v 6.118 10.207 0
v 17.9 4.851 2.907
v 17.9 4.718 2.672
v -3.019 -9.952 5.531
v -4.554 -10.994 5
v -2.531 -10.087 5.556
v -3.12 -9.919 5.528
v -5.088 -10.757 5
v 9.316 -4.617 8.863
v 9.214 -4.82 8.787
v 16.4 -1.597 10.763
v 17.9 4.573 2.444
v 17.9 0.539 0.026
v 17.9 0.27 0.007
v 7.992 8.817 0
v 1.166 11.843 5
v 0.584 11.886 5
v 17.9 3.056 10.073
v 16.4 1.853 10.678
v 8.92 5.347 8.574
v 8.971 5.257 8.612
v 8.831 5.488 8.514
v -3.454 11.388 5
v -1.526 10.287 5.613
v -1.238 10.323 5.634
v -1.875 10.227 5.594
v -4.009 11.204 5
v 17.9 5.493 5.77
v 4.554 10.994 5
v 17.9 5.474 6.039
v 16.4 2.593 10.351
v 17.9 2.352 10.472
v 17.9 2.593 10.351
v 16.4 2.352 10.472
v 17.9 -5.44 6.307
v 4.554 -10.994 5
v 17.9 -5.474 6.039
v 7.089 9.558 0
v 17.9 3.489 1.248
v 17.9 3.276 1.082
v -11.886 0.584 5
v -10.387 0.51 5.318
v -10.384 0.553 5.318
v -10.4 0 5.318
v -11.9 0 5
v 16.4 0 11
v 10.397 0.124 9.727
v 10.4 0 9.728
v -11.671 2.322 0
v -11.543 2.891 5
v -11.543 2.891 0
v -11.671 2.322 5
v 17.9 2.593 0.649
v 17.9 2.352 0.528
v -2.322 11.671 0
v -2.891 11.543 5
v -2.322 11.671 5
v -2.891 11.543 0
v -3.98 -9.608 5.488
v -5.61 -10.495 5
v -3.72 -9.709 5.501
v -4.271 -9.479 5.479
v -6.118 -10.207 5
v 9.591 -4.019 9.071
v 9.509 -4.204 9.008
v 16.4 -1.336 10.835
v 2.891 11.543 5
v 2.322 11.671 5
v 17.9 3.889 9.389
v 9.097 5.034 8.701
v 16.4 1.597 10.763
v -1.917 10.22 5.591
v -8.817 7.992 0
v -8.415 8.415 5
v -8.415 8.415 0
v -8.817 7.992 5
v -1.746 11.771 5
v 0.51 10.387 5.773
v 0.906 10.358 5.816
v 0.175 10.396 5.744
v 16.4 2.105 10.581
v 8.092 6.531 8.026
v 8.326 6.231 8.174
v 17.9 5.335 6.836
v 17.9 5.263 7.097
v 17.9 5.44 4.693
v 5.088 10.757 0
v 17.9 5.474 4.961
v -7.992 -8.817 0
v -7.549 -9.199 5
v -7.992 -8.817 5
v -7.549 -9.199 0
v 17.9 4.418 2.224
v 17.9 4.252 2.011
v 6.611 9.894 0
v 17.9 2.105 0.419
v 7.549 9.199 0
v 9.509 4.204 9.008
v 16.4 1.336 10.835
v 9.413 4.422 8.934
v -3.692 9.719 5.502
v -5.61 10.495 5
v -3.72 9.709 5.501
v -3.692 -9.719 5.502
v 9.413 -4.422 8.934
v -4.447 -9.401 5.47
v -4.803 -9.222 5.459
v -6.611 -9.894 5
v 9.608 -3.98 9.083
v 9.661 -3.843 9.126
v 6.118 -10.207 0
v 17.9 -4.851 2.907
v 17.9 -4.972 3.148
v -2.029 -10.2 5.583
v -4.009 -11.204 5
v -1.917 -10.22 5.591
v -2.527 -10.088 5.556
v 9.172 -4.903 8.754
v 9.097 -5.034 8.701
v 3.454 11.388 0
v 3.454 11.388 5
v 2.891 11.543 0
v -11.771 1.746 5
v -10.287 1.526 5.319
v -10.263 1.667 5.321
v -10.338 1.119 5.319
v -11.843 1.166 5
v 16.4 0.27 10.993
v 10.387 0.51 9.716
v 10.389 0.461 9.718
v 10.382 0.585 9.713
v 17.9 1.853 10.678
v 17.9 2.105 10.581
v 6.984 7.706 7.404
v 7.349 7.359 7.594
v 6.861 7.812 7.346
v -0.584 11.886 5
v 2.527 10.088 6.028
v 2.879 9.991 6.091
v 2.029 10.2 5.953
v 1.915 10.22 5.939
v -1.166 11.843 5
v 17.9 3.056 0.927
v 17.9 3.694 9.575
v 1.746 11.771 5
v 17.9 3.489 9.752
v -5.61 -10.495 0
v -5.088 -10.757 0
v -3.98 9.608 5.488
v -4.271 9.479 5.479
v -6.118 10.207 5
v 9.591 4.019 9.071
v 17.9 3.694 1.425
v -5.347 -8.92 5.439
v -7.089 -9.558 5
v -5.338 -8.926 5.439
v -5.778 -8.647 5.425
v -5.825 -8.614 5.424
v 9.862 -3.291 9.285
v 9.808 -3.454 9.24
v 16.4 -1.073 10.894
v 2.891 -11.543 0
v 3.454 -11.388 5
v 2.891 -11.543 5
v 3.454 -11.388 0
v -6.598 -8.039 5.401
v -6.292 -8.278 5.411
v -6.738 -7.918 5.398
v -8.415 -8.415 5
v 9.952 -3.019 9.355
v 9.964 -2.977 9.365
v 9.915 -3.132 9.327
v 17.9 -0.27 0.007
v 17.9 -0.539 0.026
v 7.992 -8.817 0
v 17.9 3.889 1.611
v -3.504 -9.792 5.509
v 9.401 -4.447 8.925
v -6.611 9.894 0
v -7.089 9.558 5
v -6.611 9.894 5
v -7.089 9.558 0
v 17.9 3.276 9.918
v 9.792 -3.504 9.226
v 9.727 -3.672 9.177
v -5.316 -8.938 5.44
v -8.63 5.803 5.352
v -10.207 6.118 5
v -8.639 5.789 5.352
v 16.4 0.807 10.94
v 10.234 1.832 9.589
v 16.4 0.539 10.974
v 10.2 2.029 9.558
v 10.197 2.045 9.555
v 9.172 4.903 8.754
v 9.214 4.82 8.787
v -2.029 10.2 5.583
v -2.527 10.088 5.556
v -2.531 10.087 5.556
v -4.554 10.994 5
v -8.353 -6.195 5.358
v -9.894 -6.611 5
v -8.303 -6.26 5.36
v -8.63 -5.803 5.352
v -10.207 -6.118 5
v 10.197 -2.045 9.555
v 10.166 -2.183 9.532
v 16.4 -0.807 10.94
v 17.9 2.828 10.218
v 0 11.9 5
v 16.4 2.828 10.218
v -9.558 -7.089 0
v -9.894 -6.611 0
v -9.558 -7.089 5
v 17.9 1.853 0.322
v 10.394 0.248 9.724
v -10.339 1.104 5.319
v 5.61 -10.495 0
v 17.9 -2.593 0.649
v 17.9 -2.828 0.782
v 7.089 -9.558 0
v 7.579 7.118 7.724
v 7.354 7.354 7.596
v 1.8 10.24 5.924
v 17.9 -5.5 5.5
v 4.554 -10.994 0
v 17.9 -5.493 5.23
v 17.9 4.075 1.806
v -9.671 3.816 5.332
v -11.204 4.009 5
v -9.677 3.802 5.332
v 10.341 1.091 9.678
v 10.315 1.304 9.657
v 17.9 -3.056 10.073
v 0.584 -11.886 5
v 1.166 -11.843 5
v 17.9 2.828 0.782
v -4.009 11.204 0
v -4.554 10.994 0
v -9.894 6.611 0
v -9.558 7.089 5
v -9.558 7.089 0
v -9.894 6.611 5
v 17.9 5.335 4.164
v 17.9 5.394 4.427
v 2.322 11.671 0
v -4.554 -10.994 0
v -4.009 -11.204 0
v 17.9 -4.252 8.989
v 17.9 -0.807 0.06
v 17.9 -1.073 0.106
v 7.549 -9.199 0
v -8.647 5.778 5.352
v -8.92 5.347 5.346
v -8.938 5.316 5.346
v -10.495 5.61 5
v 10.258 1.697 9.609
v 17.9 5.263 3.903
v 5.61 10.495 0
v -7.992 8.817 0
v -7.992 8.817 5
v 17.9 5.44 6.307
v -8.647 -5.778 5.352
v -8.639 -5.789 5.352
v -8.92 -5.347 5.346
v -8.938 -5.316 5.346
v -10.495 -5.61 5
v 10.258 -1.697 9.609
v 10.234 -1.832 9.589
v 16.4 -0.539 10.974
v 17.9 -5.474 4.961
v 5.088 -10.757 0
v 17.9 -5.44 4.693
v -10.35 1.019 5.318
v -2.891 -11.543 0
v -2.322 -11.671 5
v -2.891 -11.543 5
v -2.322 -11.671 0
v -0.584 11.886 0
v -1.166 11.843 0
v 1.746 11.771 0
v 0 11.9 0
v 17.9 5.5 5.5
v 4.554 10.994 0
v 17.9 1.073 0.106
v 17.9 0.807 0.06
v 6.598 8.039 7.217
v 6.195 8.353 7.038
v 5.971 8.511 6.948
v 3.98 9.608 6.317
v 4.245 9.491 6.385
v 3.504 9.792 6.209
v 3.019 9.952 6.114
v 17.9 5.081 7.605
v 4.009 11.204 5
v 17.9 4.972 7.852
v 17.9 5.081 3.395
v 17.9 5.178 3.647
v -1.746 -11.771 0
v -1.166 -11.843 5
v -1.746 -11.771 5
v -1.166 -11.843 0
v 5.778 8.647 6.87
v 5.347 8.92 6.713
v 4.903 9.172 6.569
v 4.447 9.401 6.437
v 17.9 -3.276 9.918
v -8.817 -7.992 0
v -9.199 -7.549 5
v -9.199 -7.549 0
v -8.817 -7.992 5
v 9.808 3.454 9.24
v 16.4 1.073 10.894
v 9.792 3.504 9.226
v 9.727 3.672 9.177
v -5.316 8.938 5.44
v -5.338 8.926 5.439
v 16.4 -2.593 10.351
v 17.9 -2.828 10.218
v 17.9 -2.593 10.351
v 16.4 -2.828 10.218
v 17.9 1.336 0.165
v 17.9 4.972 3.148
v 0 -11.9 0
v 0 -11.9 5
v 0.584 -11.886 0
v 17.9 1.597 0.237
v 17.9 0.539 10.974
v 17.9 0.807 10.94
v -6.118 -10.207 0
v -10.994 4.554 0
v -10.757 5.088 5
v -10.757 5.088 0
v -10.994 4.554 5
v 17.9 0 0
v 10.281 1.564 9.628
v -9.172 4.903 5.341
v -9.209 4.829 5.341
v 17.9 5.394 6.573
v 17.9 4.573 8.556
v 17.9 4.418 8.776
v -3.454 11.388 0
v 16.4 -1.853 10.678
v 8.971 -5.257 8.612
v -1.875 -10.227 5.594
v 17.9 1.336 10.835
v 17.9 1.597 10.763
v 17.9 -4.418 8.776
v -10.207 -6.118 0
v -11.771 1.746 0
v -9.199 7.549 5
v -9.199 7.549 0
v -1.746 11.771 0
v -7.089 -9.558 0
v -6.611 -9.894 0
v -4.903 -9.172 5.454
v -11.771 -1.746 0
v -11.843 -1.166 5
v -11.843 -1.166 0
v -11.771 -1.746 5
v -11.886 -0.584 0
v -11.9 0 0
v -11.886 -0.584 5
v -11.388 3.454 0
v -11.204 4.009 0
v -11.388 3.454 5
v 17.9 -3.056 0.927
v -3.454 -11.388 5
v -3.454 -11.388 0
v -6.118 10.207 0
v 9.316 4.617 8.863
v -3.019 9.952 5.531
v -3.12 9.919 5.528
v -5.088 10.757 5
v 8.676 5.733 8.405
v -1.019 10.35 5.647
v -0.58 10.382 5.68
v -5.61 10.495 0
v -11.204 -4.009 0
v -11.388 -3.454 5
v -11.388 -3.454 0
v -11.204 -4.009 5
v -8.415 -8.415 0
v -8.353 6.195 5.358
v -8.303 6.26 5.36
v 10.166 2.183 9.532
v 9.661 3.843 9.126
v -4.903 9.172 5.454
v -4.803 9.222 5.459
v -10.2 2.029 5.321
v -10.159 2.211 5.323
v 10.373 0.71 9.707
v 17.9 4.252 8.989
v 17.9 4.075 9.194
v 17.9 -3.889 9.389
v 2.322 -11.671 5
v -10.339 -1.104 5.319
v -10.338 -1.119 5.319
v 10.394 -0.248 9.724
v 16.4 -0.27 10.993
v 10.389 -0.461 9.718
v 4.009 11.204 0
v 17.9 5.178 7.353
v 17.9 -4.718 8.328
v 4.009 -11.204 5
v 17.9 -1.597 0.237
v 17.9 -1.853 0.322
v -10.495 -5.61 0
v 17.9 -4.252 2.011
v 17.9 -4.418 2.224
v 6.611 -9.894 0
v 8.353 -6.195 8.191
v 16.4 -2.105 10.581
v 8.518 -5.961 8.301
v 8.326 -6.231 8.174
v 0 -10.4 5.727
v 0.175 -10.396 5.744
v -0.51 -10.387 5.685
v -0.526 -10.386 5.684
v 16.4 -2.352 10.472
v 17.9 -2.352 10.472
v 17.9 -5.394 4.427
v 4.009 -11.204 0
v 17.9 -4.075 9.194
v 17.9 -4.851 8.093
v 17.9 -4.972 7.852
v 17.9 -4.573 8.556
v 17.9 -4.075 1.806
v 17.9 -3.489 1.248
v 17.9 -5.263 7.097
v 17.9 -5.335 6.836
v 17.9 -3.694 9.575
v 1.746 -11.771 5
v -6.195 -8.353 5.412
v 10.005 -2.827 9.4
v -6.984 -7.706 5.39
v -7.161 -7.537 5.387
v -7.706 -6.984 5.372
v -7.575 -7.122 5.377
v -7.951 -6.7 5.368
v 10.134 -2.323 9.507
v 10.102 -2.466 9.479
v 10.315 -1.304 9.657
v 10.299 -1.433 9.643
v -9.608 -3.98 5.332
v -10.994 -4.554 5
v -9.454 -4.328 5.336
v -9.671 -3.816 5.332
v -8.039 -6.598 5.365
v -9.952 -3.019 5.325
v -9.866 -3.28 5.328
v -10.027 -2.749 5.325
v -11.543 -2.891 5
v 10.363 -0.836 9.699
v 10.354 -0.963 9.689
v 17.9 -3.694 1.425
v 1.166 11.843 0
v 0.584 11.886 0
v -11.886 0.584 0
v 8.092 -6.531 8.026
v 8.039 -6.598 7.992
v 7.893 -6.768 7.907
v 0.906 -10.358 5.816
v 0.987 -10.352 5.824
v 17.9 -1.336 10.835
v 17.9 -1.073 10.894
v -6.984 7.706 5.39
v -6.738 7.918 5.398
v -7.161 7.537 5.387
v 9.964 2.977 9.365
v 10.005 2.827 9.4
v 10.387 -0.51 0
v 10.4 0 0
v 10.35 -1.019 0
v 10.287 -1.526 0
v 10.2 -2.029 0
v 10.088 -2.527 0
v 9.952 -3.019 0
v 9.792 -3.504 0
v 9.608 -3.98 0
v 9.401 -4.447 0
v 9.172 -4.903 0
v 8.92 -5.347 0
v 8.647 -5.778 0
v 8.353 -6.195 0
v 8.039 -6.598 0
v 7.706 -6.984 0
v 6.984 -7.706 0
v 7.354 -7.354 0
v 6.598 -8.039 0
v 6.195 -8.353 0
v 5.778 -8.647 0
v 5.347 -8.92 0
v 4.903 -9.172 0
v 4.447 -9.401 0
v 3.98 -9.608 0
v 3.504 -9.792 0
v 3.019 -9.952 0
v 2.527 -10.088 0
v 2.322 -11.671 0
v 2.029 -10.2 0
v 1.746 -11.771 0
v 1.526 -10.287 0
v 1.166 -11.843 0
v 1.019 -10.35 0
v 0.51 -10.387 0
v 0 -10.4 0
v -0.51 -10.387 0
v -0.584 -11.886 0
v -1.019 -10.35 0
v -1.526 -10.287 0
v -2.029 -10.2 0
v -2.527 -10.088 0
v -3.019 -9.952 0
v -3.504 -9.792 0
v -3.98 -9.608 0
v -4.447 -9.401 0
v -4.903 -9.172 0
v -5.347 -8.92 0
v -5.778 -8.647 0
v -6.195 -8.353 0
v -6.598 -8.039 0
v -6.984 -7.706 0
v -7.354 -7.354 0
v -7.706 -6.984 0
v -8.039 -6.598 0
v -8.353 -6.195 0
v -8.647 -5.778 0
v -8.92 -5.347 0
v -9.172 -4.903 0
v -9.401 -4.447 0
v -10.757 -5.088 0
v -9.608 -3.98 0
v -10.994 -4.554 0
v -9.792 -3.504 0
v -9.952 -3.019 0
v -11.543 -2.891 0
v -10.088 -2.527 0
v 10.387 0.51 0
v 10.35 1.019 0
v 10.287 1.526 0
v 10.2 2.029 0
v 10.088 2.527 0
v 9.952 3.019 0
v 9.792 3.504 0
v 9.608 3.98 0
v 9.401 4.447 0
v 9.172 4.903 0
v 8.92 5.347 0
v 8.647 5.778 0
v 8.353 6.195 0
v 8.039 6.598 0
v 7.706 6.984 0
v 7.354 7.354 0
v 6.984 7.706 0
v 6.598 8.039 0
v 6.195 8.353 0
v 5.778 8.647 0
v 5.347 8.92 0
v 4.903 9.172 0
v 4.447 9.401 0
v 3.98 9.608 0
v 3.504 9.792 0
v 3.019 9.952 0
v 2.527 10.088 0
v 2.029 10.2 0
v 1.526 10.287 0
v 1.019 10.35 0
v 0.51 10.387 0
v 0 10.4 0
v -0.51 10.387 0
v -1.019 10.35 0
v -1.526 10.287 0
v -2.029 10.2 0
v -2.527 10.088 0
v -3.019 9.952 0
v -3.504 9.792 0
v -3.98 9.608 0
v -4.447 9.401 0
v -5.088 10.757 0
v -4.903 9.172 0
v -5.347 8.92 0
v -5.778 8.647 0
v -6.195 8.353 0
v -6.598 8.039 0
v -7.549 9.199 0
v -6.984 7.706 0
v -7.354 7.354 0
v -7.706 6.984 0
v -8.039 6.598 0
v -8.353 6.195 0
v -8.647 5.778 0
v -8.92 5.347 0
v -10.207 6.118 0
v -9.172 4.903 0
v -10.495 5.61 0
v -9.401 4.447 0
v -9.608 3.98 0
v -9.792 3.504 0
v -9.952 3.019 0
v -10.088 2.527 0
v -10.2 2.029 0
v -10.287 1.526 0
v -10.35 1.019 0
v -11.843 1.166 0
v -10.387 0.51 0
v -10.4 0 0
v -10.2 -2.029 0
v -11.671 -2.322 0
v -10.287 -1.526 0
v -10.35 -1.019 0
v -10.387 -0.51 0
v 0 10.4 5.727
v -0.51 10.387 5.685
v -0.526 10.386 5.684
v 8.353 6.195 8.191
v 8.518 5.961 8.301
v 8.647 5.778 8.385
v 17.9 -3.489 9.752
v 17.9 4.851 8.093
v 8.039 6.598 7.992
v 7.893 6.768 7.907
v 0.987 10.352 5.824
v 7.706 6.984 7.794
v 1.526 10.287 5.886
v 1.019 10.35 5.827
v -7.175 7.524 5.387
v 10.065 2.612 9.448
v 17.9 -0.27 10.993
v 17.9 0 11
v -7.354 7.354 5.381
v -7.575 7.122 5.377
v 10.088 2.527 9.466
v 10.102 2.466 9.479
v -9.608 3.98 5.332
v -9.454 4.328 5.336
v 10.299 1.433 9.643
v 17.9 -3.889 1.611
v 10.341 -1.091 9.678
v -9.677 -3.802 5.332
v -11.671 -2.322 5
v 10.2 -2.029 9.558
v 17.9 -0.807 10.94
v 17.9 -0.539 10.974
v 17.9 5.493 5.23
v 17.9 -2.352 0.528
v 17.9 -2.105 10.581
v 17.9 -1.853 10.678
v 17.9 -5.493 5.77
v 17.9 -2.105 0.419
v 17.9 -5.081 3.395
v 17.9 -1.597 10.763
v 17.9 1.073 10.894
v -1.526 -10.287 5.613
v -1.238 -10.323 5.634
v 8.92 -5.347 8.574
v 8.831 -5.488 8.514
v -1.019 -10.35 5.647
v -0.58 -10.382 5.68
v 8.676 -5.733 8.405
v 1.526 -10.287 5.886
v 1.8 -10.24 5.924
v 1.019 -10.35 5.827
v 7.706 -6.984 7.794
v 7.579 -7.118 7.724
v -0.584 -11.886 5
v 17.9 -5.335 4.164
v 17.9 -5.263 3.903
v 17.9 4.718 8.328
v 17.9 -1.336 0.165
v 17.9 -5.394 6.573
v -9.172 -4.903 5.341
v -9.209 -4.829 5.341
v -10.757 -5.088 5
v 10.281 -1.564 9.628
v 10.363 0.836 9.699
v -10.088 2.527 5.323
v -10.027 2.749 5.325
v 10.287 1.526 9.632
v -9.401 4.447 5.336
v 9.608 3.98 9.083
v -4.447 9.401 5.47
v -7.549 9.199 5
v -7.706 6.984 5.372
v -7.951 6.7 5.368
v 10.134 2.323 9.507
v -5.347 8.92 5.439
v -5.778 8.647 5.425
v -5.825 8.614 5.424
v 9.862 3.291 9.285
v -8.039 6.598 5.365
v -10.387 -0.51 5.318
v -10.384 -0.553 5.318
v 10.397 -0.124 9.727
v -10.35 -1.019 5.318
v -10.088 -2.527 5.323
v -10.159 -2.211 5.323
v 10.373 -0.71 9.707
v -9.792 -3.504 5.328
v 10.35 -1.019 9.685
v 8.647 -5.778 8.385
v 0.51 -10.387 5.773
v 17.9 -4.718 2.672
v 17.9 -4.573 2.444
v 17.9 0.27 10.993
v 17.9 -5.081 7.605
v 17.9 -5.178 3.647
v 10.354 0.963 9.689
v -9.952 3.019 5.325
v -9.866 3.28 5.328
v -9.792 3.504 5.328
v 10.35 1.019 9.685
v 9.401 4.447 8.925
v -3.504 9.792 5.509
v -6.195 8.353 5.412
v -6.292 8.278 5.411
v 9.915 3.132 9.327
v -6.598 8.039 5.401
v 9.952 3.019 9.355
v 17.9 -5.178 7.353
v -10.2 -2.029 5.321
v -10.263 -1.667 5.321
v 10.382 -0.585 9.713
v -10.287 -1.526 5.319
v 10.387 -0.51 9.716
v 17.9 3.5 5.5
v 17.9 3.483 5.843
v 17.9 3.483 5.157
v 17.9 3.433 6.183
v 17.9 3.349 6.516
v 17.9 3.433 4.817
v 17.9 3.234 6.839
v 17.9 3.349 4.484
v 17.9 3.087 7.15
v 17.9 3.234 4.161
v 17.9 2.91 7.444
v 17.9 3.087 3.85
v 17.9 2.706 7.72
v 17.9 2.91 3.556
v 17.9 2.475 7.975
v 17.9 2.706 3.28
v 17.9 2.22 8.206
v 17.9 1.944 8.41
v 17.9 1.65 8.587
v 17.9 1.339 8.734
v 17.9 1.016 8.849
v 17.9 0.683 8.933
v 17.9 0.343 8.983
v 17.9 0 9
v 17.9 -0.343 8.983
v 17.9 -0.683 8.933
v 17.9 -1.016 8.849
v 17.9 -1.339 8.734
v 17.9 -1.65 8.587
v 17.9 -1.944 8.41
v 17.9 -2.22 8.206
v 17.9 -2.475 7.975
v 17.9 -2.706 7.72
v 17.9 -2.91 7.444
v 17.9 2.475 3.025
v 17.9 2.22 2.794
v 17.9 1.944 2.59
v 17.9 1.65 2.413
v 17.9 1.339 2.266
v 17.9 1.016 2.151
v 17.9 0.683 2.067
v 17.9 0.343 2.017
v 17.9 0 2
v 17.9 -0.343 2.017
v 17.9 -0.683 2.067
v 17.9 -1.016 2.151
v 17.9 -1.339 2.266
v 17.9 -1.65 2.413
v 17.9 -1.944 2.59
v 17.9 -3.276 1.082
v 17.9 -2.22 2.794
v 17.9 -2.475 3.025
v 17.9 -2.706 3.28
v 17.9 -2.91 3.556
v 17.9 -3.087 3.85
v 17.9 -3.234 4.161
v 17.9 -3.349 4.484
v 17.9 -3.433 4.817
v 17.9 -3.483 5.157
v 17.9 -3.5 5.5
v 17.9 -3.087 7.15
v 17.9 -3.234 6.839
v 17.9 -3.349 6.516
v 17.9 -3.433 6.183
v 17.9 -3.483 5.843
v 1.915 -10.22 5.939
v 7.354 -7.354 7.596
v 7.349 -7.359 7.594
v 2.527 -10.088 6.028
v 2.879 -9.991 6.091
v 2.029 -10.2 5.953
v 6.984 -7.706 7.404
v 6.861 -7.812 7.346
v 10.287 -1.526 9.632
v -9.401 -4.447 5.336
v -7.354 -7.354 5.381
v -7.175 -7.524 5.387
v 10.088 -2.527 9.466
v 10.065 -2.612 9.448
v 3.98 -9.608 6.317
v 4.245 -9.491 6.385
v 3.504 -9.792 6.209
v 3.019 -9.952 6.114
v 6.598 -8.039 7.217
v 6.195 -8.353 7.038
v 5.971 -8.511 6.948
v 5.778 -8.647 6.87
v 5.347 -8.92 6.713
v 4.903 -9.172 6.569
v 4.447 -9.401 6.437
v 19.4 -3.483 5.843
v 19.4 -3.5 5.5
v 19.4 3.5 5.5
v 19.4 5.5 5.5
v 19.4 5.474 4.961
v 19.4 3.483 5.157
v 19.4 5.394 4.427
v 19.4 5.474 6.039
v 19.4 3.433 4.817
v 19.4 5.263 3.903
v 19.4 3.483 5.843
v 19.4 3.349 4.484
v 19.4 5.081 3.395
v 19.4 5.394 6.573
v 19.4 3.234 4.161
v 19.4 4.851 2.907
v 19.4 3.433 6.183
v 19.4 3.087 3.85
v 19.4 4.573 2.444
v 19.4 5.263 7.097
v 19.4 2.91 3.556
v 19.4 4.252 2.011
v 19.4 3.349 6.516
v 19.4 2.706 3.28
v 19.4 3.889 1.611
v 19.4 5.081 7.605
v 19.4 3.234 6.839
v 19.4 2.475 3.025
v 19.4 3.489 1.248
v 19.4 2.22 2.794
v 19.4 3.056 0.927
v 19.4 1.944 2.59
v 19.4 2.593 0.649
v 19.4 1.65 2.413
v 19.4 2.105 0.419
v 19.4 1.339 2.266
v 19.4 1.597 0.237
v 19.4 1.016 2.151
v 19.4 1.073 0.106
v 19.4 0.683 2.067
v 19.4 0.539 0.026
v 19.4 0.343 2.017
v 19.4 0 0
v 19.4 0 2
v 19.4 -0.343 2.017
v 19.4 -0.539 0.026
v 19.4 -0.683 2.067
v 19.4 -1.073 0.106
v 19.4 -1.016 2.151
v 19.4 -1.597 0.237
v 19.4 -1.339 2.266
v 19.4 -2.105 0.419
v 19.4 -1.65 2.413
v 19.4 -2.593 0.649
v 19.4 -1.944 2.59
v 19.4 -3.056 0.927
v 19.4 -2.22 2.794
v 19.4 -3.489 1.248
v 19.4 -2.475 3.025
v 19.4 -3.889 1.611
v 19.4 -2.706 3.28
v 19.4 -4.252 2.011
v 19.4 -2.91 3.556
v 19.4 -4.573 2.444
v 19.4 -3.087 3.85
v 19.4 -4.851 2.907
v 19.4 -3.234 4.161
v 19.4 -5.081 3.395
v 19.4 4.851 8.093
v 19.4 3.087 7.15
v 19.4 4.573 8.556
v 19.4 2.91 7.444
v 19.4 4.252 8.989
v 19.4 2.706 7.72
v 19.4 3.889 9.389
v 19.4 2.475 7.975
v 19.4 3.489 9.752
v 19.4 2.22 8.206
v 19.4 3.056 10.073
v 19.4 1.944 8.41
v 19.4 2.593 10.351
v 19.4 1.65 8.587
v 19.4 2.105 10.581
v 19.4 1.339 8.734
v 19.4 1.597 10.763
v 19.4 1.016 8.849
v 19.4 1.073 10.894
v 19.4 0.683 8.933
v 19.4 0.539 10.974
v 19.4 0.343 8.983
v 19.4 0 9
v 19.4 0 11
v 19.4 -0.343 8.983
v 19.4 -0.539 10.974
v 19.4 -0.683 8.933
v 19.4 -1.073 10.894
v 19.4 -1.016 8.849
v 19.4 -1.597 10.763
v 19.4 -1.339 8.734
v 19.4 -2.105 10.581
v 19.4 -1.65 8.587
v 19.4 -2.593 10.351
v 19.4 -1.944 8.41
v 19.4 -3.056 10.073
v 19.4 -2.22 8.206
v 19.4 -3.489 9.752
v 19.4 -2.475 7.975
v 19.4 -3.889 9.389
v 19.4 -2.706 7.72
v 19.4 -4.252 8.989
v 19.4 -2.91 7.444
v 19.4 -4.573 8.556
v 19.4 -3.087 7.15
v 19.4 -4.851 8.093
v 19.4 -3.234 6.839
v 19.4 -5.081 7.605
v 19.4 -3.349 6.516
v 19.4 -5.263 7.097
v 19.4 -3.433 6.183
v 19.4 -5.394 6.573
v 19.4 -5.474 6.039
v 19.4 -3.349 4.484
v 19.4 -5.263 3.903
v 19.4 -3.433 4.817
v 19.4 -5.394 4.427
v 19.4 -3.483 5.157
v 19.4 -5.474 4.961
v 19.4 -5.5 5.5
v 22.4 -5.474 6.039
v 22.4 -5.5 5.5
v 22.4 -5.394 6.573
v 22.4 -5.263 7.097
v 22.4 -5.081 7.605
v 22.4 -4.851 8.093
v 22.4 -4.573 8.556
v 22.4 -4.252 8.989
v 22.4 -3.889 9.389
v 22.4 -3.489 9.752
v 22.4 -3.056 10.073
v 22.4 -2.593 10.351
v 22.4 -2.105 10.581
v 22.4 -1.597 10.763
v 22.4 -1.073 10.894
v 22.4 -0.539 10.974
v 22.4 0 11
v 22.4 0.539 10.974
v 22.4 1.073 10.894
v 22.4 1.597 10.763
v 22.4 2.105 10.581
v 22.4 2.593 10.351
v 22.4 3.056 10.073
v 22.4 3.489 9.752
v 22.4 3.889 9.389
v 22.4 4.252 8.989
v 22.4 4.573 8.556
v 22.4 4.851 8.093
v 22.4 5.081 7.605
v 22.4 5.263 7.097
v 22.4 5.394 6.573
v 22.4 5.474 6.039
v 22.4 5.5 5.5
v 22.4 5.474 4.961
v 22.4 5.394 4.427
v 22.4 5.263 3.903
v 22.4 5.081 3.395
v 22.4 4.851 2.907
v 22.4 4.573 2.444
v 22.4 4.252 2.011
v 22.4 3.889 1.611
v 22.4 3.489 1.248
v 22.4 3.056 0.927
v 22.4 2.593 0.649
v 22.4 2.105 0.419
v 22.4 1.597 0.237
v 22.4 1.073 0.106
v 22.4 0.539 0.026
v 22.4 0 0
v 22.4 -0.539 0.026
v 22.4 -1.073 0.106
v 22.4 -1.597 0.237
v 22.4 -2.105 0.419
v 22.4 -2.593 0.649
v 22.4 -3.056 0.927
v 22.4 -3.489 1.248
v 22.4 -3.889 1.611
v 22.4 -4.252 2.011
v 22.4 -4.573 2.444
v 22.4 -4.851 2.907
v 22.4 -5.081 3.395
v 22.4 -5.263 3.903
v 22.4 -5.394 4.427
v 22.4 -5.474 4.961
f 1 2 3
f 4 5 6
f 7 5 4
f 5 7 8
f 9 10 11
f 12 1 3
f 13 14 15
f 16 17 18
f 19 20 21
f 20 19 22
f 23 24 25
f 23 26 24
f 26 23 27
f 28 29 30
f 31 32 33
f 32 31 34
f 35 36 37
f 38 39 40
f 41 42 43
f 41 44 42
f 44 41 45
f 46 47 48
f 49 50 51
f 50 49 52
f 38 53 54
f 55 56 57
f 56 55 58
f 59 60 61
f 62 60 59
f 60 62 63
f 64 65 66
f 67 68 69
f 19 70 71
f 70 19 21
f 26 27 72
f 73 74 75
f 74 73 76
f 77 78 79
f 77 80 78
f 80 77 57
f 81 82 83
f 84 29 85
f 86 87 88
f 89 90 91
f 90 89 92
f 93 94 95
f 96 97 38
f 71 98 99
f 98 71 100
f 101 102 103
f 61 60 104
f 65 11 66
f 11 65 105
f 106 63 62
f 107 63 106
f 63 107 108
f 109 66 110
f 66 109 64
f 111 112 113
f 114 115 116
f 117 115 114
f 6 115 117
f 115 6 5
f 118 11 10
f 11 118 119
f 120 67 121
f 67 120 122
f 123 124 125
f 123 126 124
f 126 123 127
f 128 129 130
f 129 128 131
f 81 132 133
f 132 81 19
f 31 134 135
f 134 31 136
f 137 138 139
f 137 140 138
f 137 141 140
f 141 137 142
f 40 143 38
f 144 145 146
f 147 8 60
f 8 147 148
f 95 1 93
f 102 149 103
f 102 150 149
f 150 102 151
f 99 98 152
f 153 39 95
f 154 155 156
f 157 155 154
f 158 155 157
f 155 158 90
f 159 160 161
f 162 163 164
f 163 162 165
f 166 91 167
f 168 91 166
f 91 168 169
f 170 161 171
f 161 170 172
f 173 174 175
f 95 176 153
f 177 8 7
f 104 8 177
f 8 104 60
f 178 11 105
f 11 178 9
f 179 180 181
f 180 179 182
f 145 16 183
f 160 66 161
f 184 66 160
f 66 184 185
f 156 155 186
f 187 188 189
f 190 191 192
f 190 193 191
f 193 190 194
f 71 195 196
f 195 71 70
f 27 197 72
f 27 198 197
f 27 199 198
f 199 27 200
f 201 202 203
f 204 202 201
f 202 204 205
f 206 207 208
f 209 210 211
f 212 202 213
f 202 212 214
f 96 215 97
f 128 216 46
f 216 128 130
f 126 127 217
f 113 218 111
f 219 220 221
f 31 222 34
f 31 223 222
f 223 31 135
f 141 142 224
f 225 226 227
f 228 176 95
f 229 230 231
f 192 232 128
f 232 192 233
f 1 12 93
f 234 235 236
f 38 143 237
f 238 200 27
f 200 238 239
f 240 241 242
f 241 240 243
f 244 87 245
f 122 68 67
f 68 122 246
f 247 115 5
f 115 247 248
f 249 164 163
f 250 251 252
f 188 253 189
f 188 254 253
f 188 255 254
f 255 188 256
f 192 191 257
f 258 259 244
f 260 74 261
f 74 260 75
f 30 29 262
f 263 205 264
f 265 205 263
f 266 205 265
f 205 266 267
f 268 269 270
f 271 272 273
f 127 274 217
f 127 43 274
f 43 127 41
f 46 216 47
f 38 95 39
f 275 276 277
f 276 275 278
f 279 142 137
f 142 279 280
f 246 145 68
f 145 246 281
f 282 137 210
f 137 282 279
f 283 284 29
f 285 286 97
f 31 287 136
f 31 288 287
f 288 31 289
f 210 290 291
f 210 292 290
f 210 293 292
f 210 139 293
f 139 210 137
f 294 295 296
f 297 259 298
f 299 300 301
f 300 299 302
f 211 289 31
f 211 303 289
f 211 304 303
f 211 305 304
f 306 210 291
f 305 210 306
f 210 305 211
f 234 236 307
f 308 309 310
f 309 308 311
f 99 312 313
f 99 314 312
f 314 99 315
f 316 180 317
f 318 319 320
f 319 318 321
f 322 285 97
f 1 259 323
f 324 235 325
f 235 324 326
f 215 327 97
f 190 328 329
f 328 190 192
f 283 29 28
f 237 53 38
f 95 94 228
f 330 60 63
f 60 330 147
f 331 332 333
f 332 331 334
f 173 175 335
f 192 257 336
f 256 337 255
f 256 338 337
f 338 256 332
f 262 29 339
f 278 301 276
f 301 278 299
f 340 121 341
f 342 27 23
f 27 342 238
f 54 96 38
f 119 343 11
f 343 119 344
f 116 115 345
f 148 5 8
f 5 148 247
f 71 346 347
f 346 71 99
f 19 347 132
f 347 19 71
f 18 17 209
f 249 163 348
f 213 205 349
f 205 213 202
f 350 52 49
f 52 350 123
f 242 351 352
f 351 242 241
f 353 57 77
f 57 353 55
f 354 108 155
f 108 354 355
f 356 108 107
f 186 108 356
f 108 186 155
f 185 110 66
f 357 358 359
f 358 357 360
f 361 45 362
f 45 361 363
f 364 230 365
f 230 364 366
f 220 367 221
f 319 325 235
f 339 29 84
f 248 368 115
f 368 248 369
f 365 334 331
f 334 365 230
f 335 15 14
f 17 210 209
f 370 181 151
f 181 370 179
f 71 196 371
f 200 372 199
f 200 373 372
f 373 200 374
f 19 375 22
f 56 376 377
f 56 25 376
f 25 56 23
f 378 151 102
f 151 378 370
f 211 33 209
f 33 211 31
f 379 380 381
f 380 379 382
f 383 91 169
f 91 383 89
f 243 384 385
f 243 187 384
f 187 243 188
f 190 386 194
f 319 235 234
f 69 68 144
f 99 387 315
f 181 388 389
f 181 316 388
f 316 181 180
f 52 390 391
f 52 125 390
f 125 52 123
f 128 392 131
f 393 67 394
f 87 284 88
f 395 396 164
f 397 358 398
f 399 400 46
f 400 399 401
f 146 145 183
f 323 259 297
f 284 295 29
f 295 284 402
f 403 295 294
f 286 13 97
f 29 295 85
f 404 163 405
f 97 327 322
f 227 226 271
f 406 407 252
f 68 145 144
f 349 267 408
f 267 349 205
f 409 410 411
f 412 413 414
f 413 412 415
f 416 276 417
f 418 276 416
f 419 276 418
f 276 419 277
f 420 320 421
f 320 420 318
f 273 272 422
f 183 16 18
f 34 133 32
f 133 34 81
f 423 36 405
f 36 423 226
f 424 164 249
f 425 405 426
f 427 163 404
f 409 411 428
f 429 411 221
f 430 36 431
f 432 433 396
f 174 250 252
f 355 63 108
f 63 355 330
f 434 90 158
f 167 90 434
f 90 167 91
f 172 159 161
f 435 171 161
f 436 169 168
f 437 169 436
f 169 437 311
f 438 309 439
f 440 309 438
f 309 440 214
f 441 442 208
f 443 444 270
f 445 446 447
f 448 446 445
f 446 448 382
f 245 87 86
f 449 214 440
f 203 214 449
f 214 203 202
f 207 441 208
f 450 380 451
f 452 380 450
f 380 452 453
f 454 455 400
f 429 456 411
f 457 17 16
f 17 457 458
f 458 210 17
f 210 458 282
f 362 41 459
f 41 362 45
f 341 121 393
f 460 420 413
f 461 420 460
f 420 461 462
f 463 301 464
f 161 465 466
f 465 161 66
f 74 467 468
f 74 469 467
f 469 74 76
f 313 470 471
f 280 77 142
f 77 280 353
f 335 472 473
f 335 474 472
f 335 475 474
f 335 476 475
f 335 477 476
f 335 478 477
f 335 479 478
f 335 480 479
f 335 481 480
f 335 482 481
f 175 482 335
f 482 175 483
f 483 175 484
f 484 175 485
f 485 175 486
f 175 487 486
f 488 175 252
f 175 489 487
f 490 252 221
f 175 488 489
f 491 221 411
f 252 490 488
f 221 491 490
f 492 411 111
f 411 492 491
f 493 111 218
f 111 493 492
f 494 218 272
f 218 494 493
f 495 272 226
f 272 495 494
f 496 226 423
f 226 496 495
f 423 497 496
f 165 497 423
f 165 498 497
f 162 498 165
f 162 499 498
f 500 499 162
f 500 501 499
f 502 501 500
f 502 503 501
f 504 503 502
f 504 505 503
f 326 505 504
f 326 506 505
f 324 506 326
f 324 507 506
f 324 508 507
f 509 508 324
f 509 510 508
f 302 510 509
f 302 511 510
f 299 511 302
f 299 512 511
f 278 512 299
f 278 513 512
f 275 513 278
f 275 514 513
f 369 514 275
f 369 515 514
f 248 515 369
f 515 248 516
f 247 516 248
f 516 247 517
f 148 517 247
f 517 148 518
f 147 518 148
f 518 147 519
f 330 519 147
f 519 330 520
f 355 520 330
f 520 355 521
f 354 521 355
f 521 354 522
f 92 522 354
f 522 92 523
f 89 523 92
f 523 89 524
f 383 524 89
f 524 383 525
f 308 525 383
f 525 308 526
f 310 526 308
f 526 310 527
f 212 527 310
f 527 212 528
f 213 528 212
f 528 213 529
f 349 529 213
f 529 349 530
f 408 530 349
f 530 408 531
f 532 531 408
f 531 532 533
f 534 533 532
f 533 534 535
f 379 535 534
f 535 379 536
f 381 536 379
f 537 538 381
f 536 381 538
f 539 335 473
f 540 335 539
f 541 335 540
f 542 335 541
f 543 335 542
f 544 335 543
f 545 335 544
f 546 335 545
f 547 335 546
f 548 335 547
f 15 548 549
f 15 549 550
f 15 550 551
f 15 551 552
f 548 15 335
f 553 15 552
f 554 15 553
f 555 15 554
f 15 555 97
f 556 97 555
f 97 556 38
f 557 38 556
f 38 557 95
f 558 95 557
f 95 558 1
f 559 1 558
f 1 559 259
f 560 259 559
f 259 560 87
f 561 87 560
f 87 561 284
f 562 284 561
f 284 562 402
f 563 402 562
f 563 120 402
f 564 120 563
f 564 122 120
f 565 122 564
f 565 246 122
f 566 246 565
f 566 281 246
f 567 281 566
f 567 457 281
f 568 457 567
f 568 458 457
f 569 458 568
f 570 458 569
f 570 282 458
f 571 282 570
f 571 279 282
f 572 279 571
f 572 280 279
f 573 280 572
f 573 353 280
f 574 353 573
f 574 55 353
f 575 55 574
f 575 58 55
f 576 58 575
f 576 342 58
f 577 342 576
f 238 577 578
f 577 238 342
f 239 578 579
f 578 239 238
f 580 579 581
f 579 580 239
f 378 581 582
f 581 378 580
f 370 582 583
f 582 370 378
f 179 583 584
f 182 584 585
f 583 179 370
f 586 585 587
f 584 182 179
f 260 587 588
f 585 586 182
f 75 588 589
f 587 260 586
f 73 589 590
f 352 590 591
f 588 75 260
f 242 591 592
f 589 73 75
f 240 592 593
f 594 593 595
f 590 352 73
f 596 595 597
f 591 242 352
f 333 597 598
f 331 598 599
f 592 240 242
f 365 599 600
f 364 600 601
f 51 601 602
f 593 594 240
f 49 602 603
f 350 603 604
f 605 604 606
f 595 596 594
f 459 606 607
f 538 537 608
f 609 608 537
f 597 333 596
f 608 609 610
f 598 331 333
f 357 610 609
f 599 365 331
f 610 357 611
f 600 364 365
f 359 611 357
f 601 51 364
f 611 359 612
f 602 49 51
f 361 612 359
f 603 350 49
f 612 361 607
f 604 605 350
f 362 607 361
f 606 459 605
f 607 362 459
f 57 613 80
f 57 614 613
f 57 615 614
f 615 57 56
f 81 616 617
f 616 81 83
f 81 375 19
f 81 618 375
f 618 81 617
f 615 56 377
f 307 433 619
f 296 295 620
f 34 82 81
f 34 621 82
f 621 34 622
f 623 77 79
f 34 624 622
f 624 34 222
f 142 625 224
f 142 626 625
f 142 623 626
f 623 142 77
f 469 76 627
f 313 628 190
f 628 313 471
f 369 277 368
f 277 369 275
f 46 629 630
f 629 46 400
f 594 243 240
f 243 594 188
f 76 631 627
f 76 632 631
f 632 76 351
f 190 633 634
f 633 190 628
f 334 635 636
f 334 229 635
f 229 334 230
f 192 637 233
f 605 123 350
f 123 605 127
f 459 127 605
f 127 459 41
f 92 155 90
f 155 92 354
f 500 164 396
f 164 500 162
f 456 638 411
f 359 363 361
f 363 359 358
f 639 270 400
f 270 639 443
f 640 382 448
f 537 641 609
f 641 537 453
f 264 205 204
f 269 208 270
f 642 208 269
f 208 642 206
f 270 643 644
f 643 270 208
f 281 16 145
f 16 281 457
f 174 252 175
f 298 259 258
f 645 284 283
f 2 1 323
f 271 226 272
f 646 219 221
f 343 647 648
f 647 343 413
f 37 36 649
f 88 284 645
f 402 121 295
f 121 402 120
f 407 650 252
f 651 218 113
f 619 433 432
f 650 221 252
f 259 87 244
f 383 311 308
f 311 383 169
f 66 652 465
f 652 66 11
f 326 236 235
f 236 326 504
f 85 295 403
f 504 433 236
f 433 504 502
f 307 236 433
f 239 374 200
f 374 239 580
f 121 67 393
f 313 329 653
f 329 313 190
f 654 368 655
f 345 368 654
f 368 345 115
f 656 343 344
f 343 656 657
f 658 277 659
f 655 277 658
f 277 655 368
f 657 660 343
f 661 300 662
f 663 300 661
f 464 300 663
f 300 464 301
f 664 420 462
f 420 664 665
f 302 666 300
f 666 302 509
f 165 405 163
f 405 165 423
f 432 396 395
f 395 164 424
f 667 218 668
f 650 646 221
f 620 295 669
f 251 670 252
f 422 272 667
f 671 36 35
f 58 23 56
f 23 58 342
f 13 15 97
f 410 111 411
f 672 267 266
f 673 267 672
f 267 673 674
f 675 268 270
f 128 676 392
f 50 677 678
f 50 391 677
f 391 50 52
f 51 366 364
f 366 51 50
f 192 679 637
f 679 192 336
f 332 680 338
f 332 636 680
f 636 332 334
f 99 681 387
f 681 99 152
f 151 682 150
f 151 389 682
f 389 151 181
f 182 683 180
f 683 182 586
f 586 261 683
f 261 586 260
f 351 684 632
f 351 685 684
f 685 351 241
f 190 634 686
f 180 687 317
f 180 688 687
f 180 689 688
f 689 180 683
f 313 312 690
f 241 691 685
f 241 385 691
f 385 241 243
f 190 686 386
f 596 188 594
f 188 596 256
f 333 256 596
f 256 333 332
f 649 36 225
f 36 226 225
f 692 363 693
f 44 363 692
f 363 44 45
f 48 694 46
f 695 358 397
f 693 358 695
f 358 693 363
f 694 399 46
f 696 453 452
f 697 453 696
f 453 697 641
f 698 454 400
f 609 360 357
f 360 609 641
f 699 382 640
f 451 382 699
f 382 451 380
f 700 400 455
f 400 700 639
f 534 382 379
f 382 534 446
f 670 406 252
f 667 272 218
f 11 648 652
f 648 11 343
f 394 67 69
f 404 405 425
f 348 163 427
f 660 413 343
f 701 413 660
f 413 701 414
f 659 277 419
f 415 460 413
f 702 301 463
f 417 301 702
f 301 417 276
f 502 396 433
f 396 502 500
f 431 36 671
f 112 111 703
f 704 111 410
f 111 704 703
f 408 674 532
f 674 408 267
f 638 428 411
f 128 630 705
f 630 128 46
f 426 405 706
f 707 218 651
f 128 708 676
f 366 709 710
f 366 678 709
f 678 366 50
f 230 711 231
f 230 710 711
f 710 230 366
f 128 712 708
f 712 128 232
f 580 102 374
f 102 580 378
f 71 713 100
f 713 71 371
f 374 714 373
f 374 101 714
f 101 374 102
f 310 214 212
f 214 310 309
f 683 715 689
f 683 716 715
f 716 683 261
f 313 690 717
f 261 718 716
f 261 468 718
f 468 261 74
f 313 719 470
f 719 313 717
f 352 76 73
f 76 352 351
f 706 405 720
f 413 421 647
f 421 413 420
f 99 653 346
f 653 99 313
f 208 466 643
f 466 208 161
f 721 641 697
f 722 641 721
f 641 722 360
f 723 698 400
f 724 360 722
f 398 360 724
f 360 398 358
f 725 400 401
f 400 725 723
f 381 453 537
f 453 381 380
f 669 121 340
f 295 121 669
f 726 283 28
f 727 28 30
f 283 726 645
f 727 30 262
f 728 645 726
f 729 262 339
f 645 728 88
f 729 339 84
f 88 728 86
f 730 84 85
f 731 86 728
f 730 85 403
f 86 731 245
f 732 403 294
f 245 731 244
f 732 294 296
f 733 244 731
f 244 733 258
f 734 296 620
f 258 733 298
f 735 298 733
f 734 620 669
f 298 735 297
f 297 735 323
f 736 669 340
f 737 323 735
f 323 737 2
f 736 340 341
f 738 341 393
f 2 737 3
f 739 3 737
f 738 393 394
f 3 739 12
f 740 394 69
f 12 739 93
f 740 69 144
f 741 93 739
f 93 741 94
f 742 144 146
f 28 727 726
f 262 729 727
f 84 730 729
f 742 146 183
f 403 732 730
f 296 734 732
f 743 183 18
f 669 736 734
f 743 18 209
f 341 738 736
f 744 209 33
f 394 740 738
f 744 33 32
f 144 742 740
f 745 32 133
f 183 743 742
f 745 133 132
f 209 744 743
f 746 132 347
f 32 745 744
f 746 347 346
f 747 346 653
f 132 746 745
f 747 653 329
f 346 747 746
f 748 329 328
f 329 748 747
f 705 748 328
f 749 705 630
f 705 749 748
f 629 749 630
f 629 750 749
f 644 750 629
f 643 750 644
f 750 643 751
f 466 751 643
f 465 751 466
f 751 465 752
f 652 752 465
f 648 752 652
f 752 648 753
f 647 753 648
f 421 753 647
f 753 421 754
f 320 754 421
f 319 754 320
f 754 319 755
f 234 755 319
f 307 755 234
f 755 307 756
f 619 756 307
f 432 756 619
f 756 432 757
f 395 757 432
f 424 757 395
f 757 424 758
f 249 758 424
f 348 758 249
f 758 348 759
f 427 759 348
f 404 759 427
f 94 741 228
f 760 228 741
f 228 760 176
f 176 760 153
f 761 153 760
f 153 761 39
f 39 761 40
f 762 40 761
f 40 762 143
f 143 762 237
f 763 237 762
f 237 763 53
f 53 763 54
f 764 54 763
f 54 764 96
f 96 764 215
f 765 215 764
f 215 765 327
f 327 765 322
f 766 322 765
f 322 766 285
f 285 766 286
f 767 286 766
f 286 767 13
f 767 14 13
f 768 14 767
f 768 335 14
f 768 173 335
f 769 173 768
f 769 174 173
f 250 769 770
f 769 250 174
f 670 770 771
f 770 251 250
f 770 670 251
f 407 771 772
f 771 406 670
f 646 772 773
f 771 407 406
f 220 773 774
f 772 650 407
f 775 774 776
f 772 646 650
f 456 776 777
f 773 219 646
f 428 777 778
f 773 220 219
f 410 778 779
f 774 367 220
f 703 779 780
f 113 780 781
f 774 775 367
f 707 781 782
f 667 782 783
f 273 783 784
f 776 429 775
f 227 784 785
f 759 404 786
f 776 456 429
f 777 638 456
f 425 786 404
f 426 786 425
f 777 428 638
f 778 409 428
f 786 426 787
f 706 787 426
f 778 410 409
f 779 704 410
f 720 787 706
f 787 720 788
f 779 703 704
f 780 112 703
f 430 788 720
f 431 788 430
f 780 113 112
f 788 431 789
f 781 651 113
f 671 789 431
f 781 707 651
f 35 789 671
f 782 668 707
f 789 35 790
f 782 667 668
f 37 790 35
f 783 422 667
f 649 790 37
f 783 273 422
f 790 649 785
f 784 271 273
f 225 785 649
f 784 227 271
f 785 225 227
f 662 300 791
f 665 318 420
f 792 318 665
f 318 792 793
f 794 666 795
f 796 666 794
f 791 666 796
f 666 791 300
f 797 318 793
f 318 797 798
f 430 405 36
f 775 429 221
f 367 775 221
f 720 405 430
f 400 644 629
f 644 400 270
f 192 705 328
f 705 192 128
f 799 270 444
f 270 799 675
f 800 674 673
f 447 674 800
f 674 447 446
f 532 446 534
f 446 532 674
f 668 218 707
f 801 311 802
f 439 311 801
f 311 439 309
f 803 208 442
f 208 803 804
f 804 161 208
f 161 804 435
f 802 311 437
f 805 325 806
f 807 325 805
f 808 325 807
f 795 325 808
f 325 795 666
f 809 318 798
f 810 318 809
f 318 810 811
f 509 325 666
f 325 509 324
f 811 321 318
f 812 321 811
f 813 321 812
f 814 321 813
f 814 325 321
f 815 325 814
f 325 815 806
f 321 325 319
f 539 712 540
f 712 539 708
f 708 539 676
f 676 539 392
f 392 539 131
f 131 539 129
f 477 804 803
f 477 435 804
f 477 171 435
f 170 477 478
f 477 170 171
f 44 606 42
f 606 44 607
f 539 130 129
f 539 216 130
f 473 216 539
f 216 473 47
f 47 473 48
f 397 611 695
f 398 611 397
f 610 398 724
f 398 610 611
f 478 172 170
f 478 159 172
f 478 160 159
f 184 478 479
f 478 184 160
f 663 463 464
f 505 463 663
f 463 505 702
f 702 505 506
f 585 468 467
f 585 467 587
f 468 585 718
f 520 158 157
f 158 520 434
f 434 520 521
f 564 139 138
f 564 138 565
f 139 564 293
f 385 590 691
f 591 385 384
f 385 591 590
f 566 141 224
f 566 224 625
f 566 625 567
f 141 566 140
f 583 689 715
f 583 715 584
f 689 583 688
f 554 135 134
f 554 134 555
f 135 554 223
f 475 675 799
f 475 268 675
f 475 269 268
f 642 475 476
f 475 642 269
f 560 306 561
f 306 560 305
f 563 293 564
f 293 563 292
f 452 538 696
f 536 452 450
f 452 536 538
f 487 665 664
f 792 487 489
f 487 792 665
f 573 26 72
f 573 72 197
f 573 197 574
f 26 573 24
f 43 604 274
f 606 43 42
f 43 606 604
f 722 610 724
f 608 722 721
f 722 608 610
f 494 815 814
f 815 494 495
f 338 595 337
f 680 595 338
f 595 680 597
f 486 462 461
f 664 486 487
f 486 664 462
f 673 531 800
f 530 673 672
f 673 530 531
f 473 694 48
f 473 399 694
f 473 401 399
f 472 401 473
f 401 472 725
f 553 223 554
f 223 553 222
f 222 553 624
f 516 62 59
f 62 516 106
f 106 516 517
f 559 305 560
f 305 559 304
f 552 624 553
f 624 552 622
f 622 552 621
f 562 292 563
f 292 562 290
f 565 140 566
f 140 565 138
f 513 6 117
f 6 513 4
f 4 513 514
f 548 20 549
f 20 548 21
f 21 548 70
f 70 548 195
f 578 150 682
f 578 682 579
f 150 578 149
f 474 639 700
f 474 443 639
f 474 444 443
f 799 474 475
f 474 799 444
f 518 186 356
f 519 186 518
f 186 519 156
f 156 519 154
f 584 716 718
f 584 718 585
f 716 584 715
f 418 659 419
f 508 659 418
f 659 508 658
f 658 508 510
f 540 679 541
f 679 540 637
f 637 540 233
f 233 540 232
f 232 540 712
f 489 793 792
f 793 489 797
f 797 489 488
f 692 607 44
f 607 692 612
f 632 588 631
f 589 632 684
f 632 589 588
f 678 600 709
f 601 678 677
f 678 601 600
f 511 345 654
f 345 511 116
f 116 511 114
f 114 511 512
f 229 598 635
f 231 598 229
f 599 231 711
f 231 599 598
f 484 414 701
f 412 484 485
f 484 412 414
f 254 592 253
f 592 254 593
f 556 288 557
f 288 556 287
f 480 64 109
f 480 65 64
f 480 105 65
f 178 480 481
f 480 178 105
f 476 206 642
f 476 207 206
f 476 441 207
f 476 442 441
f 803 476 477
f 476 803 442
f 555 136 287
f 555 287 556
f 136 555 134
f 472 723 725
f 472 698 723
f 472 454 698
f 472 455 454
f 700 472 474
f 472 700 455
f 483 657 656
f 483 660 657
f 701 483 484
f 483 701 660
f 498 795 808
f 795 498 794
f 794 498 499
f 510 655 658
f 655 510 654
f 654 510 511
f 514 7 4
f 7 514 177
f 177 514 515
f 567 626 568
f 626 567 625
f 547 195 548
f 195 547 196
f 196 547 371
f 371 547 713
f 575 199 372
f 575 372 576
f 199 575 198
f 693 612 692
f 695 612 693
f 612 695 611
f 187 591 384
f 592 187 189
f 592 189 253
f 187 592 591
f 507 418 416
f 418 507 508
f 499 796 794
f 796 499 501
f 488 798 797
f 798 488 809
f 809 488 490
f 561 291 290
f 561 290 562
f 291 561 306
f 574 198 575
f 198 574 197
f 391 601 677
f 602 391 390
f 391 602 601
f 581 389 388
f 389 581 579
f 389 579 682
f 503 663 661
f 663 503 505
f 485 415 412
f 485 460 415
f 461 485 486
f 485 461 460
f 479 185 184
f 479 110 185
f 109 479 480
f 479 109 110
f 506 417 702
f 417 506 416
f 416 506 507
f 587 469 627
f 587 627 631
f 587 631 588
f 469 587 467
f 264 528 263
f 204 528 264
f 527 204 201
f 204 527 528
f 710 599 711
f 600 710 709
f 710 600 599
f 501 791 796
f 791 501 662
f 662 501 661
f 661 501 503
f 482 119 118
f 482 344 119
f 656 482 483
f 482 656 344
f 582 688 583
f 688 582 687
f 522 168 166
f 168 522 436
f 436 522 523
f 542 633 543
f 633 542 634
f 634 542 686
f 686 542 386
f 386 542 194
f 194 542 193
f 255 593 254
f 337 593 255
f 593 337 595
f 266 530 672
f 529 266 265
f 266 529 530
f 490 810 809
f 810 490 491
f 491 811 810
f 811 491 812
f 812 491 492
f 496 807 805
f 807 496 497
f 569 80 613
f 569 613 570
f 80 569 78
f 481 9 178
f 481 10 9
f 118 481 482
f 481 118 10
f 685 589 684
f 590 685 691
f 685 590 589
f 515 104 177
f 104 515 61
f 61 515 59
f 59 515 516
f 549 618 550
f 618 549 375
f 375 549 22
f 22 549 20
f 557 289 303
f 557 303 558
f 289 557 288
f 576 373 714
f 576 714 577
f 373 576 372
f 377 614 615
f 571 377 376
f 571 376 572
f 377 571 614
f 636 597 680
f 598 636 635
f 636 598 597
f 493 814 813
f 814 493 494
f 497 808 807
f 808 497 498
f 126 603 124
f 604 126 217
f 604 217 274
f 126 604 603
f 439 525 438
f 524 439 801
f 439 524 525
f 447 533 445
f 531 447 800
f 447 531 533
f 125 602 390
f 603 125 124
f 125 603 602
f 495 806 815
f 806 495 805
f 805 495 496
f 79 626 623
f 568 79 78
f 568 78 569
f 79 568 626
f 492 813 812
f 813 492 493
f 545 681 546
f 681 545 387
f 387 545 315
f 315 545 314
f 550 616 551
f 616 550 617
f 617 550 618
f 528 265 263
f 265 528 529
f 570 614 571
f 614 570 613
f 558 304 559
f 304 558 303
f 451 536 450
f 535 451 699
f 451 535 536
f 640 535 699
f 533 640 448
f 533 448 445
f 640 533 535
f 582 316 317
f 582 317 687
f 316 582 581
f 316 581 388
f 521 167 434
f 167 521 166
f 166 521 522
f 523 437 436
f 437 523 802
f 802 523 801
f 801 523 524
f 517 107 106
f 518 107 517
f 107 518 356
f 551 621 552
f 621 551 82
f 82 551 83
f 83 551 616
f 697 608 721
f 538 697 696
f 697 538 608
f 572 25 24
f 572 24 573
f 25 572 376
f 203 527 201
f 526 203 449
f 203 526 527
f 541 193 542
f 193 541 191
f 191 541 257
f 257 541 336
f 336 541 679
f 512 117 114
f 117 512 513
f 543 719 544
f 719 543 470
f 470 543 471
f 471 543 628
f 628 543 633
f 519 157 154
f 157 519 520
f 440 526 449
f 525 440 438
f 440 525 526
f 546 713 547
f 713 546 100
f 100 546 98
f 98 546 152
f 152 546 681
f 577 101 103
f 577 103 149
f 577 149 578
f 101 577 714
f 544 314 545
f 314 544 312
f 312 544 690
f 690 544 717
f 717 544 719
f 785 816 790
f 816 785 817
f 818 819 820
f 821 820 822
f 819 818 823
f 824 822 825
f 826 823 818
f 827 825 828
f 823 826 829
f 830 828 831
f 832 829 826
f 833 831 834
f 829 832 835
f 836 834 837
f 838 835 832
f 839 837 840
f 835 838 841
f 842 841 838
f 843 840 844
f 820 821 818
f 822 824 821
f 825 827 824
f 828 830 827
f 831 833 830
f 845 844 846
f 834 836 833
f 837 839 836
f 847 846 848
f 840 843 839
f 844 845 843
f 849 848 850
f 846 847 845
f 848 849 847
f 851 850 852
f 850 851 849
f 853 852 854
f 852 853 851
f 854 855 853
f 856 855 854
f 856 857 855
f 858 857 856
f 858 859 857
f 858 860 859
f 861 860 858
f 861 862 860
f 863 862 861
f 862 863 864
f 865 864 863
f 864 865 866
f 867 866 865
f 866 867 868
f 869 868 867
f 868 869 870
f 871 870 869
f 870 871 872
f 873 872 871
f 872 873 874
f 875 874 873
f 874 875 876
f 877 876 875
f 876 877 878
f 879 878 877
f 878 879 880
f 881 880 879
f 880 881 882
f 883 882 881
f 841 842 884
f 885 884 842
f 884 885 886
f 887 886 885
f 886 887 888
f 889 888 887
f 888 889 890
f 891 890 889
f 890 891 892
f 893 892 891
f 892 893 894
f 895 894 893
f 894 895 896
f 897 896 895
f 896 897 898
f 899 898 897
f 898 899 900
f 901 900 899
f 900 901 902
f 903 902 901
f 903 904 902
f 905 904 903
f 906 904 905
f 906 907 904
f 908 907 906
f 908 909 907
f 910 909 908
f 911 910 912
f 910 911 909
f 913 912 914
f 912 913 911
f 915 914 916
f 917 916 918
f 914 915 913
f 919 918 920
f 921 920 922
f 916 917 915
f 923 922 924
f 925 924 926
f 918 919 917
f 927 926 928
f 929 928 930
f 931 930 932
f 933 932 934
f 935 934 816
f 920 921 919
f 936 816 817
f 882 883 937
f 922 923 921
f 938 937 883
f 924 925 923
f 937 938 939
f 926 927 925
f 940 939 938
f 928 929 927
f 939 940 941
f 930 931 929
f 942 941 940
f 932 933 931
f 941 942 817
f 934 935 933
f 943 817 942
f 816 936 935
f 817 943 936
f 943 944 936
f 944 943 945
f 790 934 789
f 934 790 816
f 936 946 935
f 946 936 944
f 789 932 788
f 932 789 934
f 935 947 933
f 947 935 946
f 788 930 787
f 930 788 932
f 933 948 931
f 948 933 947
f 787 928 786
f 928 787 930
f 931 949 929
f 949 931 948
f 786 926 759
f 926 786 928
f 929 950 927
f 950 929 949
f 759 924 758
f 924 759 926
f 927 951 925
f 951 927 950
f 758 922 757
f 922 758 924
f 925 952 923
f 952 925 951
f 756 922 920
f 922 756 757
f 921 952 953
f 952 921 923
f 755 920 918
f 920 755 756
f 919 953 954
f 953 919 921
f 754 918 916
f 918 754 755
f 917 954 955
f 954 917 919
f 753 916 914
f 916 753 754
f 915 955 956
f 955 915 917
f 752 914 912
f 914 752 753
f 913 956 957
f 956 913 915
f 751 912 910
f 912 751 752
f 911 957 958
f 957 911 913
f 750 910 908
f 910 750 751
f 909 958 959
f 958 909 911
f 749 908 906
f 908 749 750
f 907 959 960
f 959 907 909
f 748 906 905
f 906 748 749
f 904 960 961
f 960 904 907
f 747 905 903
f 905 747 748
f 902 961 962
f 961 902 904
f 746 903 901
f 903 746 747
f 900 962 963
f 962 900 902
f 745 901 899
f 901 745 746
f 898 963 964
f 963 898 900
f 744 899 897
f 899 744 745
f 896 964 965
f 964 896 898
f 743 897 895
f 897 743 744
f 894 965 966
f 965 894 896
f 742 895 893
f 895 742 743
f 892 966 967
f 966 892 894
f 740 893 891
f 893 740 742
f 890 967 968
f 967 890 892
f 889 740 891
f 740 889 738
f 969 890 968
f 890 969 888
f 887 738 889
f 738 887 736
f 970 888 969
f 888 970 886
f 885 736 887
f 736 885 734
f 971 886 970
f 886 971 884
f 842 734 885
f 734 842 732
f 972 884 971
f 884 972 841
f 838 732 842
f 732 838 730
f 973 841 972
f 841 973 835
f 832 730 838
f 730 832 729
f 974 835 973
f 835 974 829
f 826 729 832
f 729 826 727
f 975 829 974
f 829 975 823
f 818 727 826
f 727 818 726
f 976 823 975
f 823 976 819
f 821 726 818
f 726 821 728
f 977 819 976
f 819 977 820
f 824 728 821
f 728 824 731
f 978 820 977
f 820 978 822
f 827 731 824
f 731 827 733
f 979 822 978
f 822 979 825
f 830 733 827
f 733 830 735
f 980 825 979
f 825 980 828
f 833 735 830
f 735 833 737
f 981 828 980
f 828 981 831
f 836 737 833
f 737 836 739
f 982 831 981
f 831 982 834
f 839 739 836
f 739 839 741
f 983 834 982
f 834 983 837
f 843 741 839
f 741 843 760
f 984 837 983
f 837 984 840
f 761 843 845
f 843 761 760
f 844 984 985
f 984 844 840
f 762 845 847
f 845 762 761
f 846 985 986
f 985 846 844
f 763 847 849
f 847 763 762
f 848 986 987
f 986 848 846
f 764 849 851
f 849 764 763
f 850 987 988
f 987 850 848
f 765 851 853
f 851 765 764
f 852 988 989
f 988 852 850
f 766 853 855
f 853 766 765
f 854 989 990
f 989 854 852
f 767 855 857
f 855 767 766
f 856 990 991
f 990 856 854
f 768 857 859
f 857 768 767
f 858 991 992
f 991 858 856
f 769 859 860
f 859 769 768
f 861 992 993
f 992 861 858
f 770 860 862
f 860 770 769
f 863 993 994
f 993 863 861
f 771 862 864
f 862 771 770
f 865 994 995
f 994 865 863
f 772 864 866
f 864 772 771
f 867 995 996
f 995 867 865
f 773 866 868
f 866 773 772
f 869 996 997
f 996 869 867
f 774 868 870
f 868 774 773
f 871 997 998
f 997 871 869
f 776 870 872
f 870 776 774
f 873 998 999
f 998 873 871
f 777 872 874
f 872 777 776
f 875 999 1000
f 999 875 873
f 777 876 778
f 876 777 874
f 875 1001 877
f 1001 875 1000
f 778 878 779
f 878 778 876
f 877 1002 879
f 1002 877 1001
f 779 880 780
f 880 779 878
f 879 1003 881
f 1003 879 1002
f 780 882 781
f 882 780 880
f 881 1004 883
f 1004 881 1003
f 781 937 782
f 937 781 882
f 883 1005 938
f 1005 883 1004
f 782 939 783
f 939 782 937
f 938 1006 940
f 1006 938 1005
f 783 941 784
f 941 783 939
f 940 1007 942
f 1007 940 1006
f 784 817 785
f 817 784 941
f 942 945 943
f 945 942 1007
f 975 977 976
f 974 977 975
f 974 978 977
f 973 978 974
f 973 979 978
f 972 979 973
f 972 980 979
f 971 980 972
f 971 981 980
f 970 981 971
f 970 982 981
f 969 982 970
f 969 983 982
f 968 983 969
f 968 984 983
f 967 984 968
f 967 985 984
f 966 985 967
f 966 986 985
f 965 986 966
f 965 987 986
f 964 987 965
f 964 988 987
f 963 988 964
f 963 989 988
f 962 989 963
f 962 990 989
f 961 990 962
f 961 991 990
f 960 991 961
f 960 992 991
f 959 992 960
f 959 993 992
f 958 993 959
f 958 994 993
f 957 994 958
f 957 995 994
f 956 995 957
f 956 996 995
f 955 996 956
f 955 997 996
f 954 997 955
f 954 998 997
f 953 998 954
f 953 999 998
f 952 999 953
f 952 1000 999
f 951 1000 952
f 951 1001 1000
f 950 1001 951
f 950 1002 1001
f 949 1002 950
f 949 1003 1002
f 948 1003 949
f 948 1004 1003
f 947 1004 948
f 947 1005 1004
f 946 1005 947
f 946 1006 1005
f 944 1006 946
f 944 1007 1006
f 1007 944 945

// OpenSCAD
MIN_H = 3;
THICKNESS = 1.5;
PEG_OUTER_RADIUS = 5.5;
PEG_INNER_RADIUS = 3.5;

/**
 * Return the x-offset to the groove in the peg
 */
boltlessPegOffset = function (h = 11.5) h - MIN_H - THICKNESS;  
 
/**
 * Creates a peg for usage in boltless shelving uprights
 */
module boltlessPeg(h = 11.5) {
  t = THICKNESS;
  r1 = PEG_INNER_RADIUS;
  r2 = PEG_OUTER_RADIUS;
  minH = MIN_H;
  
  h1 = boltlessPegOffset(h);            
  h2 = h - minH;
  h3 = h;
  
  poly = [
    [0,  0],
    [r2, 0],
    [r2, h1],
    [r1, h1],
    [r1, h2],
    [r2, h2],
    [r2, h3],
    [0,  h3]
  ];
    
  rotate([90, 0, 90])
    rotate_extrude(angle = 360, $fn = 64) 
      polygon(poly);
}

/**
 * Create a boltless ring holder, with optional base
 */
module boltlessHolder(
  d = 58, 
  pegHeight = 11.5,
  pegXOffset = 11,
  ringHeight = PEG_OUTER_RADIUS * 2, 
  ringThickness = 5,
  centerRing = true,
  base = false,
  baseHeight = 2.4,
  innerFn = 128,
  outerFn = 128,
  pegFn = 128
) {
  r = d / 2 + pegXOffset;
  halfHeight = ringHeight / 2;

  pegD = PEG_OUTER_RADIUS * 2;
  pegOffset = boltlessPegOffset(pegHeight);
  
  zOffset = abs(pegD - ringHeight) / 2;
  
  // PEG
  translate([r, 0, PEG_OUTER_RADIUS]) 
    boltlessPeg(pegHeight);

  // HOOP
  translate([0, 0, zOffset])
    difference() {
      // HOOP: OUTER SHELL
      hull() {
        translate([0, 0, centerRing ? 0 : -zOffset]) 
          linear_extrude(ringHeight)
            circle(d = d + ringThickness, $fn = outerFn);

        // Need to reset z-translation here
        translate([r, 0, halfHeight])
          rotate([90, 0, 90]) 
            cylinder(h = pegOffset, d = pegD, $fn = pegFn);
      }

      sliceOffset = 1 + zOffset * 2;
      
      // HOOP: SLICER
      translate([0, 0, -sliceOffset / 2]) 
        linear_extrude(sliceOffset + ringHeight)
          circle(d = d, $fn = innerFn);
    }

  // HOOP: BASE
  if (base) {
    linear_extrude(baseHeight)
      circle(d = d + ringThickness, $fn = outerFn);
  }
}
 

boltlessHolder(20.8, ringHeight = 5, ringThickness = 3, centerRing = false, pegXOffset = 6, pegHeight = 6);

// LARGE CYLINDER VASE
*group() {
  boltlessHolder();
  translate([80, -40, 0]) 
    rotate([0, 0, 180]) 
      boltlessHolder(base = true);
}
